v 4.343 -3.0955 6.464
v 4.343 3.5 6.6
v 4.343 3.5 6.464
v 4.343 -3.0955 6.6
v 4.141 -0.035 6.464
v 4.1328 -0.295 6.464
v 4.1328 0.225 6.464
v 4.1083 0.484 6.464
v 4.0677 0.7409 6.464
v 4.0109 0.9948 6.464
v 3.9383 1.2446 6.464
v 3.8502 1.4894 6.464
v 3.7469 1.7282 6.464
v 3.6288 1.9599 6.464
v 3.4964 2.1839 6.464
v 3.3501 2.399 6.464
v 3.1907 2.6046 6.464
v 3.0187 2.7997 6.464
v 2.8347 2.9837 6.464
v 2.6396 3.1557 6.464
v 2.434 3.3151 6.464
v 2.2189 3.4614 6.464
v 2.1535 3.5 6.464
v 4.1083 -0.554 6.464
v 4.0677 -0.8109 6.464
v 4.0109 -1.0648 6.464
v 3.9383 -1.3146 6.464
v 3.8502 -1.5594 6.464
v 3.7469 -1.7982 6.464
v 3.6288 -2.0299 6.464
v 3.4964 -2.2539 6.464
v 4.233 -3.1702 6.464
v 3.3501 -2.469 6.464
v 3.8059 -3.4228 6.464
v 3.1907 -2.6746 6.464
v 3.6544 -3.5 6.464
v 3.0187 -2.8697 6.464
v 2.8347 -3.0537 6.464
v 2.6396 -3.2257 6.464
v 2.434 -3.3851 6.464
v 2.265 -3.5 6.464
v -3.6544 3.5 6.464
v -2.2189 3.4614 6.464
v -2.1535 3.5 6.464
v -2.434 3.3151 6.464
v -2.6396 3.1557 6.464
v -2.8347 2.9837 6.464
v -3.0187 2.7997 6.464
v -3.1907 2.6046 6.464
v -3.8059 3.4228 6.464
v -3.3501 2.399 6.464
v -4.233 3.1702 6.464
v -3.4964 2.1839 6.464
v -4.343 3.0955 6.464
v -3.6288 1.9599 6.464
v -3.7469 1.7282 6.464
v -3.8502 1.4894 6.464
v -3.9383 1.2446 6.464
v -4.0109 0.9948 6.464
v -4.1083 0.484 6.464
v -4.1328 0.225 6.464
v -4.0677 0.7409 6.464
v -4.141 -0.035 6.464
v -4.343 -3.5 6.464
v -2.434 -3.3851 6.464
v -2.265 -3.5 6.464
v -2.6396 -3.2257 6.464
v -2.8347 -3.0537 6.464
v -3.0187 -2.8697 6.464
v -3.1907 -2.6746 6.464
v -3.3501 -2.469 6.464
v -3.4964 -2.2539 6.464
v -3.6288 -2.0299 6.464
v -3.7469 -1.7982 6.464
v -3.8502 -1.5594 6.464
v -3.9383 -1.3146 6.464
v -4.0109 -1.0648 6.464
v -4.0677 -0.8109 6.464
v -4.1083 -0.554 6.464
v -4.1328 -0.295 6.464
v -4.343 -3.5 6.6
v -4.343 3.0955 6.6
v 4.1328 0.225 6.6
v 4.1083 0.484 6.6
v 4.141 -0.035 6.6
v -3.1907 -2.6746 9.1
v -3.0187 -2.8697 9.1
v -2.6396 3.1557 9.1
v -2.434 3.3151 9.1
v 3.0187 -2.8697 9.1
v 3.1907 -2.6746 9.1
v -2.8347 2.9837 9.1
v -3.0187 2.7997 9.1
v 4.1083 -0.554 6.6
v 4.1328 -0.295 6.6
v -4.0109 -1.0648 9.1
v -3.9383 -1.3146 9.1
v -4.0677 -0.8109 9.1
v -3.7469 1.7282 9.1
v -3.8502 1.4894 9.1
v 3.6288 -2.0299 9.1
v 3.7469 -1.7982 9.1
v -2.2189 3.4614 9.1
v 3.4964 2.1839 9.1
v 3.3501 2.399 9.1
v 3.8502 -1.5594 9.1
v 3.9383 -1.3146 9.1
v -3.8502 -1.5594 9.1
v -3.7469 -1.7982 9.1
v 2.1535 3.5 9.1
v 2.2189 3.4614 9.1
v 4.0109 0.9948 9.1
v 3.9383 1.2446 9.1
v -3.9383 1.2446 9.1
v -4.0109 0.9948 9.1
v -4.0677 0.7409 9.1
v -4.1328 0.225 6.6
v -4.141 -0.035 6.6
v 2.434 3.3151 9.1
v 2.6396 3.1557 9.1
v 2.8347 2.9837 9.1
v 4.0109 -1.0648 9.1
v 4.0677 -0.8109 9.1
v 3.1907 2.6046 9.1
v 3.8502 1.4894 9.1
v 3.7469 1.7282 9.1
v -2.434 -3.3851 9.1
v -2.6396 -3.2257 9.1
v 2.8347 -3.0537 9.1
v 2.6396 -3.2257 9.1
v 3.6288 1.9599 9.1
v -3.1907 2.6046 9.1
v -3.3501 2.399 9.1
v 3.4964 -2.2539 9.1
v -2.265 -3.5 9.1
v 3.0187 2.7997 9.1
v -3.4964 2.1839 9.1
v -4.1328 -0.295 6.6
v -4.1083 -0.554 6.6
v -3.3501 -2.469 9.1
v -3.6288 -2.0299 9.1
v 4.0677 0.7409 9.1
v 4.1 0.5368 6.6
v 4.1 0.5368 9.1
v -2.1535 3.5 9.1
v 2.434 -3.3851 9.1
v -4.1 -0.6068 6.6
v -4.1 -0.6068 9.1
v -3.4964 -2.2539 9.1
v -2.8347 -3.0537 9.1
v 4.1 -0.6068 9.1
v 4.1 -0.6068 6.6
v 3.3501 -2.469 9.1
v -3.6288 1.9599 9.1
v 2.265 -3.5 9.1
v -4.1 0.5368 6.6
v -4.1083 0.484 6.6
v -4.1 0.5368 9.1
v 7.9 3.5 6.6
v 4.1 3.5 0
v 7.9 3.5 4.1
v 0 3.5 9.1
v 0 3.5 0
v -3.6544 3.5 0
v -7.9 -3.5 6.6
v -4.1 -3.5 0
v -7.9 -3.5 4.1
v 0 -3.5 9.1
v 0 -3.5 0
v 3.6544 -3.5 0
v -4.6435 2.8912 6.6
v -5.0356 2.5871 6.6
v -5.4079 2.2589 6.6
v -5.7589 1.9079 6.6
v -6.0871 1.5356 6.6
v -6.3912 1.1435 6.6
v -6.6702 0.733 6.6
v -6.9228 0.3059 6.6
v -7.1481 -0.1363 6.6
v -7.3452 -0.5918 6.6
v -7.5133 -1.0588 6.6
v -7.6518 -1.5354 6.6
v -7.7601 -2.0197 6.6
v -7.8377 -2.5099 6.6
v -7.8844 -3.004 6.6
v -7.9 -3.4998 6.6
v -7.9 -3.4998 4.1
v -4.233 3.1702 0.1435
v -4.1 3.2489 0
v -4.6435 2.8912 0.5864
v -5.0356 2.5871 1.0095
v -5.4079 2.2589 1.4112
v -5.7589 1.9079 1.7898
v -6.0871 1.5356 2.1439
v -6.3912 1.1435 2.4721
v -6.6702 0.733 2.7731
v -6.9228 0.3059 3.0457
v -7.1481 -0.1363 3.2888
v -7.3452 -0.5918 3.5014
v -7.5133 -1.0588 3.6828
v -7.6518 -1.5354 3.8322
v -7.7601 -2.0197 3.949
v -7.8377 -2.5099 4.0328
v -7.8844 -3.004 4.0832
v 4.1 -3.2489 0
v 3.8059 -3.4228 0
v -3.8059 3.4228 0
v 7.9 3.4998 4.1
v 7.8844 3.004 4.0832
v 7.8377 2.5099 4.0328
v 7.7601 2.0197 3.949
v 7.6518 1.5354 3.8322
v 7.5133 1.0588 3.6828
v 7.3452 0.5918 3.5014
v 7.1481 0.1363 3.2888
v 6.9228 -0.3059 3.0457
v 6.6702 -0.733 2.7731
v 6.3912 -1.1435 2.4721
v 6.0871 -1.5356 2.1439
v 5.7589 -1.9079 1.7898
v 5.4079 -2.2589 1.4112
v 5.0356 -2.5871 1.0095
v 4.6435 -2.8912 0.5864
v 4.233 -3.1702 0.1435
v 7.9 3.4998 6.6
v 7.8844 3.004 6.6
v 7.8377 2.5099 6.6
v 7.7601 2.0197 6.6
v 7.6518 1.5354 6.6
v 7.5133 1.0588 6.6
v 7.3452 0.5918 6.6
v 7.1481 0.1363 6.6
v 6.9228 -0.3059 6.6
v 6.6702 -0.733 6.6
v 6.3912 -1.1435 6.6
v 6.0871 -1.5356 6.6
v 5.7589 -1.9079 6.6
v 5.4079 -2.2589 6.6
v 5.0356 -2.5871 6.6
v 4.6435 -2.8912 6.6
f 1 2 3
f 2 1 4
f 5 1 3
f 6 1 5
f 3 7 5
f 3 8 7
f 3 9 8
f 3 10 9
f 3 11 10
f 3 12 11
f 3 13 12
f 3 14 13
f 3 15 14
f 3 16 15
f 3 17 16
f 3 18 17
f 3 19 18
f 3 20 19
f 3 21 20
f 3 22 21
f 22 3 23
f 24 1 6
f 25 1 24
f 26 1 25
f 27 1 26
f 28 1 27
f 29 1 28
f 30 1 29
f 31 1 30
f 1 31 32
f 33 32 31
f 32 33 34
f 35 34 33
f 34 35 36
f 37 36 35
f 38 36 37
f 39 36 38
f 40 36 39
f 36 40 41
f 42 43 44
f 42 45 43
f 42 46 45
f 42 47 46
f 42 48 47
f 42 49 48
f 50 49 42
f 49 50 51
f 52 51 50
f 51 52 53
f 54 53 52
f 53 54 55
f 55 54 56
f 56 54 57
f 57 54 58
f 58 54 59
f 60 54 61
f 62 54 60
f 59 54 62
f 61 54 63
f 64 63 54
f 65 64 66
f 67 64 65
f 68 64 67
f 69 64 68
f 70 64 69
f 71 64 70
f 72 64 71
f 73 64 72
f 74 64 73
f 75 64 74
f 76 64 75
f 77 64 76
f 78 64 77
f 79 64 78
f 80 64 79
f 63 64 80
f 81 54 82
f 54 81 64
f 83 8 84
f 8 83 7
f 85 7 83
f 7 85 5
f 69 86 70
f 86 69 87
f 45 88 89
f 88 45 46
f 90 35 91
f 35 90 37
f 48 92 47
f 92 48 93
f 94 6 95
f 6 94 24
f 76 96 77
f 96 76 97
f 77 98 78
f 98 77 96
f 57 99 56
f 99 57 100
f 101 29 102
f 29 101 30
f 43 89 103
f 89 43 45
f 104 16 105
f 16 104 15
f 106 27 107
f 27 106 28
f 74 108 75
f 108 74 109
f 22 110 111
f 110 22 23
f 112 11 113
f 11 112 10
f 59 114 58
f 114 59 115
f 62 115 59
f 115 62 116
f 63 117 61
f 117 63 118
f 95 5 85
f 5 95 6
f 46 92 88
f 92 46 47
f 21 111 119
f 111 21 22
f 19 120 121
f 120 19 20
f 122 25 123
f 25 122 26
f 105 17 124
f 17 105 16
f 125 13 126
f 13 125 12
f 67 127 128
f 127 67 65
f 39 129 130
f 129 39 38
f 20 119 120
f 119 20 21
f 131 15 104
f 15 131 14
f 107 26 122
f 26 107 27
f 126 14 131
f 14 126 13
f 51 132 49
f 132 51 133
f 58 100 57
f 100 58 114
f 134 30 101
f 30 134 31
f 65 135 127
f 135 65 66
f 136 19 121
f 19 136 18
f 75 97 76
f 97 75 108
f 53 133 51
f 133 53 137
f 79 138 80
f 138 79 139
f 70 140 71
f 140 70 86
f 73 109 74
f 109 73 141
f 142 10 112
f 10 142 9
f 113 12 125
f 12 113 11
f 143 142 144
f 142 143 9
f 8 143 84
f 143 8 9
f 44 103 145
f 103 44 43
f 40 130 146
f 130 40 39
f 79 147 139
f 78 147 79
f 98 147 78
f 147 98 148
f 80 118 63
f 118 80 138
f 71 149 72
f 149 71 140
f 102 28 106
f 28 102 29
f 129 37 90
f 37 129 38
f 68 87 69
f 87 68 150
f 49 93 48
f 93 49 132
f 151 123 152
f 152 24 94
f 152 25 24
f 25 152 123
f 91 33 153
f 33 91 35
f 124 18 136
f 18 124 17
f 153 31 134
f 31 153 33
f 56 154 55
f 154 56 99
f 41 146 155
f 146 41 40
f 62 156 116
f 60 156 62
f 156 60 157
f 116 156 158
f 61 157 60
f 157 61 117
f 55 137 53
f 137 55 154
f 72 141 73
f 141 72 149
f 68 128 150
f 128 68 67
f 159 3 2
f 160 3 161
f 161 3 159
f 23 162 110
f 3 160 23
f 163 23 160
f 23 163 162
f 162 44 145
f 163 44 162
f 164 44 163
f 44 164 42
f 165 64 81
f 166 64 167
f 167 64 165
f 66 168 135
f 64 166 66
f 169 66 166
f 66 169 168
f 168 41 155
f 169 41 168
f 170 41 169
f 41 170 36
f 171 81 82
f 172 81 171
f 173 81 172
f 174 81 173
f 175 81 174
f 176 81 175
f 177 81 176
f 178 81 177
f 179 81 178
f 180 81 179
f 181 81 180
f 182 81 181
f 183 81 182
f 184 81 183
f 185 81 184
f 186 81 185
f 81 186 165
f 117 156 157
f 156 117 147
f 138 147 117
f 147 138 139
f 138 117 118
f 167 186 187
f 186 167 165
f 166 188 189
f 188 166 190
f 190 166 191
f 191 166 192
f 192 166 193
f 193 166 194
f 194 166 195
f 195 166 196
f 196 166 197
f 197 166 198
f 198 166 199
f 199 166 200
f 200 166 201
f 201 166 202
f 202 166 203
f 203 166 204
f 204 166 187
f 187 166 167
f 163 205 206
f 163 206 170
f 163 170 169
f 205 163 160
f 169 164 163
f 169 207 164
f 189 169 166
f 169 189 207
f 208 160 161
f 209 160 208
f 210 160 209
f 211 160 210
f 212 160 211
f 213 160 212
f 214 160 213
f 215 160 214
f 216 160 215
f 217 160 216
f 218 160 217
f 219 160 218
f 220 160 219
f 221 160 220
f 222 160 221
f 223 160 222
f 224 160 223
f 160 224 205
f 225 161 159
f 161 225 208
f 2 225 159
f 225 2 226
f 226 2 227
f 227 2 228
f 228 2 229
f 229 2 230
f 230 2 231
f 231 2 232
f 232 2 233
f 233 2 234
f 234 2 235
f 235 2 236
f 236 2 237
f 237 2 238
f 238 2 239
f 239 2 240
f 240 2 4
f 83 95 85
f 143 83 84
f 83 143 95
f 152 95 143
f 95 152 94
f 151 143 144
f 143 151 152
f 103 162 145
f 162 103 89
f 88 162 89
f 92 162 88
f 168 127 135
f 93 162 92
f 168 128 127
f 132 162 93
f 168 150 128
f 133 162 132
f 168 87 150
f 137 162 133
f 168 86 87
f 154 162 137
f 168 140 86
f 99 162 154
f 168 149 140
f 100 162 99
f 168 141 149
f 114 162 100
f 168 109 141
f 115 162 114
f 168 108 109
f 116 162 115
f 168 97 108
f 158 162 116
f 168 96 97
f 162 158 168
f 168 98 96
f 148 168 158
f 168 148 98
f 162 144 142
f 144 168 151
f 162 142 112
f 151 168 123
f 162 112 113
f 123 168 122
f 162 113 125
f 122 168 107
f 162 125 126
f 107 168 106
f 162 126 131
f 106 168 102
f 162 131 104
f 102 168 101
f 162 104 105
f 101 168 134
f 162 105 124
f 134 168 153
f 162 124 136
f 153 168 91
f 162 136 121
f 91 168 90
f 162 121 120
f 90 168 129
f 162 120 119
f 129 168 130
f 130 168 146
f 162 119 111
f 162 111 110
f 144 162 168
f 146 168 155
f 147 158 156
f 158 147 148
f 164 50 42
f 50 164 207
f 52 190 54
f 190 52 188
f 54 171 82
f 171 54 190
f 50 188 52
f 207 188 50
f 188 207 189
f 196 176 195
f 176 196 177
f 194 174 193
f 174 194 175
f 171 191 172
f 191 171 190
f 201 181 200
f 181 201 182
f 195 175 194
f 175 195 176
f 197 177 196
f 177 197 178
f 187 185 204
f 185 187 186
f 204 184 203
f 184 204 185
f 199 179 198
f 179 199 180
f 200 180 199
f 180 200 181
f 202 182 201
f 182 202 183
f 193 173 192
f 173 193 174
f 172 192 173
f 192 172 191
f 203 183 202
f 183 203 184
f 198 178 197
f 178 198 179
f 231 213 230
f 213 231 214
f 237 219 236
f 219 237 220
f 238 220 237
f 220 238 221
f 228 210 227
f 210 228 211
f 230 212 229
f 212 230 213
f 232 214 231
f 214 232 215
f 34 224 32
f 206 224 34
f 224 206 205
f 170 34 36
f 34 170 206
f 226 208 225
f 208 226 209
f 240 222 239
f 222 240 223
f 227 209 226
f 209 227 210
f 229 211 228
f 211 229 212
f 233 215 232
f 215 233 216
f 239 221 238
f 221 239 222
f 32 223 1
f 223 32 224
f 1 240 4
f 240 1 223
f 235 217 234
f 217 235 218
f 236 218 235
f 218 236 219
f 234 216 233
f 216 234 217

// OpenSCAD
width = 5;//has to be less than 7.9 for 303 profile, otherwise crash!

AL3030 = 
[
[0,0],
[4.1,0],
[7.9,4.1],
[7.9,6.6],
[4.1,6.6],
[4.1,9.1],
[0,9.1]
];
AL2020 = [];
AL1010 = [];
AL4040 = [];
fittol = 0.8;

function profile(x) = x == 40 ? AL4040 : x == 30 ? AL3030 : x == 20 ? AL2020: x == 10 ? AL1010: [];

//echo("trigo = ", 7.9*cos(asin(5/7.9)), " short = ",7.9*sqrt(1-pow(5/7.9,2)));

maxlength = AL3030[2][0]*sqrt(1-pow(width/AL3030[2][0],2));

  //scale([maxlength/alpro[2][0],fittol,1]) 
hammerhead_nut(alpro = AL3030, width = width+2);

function zoffset(x,def) = x == true? -def[6][1] : 0;
module hammerhead_nut(alpro, width, topalign = false)
{
          translate([0,-width/2,zoffset(topalign,alpro)])
  intersection()
  {
    union()
    {
      translate([0,width,0]) 
      {
        difference()
        {
          translate([0,-width/2,+alpro[6][1]])
          aluInsert(alpro,h=width);
          scale([1.01,1.01,1.01])
            translate([0,-width/2,(alpro[4][1])-.0])
            {
              difference()
              {
                color("blue")
                  translate([0,0,(alpro[6][1]-alpro[4][1])/2-.1])
                  cube([2*alpro[1][0]+.4, width+.2,alpro[6][1]-alpro[4][1]+.2],center = true);
                translate([0,0,-1])
                  color("red")
                  cylinder(r=alpro[1][0], h= alpro[6][1]-alpro[4][1]+4, $fn=100);
              }
            }
        }
      }
    }
    union()
    {
      difference()
      {
        cylinder(r=alpro[2][0], h= alpro[6][1], $fn=100);
        translate([2.5*alpro[2][0]/2,0,alpro[6][1]/2-.1])
          cube([2.5*alpro[2][0],2.5*alpro[2][0],alpro[6][1]+2],center=true);
      }
      //color("blue")
      translate([0,width,0])
      {
        difference()
        {
          cylinder(r=alpro[2][0], h= alpro[6][1], $fn=100);
          translate([-2.5*alpro[2][0]/2,0,alpro[6][1]/2-.1])
            cube([2.5*alpro[2][0],2.5*alpro[2][0],alpro[6][1]+2],center=true);
        }
      }
    }
  }
}// module hammerhead_nut()

module aluInsert(alpro,h)
{
  translate([0,h/2,-alpro[6][1]])
  rotate([90,0,0])
    linear_extrude(height=h)
    union()
    {
      polygon(alpro);
      mirror([1,0,0]) polygon(alpro);
    }
}//module aluInsert(alpro,h)
